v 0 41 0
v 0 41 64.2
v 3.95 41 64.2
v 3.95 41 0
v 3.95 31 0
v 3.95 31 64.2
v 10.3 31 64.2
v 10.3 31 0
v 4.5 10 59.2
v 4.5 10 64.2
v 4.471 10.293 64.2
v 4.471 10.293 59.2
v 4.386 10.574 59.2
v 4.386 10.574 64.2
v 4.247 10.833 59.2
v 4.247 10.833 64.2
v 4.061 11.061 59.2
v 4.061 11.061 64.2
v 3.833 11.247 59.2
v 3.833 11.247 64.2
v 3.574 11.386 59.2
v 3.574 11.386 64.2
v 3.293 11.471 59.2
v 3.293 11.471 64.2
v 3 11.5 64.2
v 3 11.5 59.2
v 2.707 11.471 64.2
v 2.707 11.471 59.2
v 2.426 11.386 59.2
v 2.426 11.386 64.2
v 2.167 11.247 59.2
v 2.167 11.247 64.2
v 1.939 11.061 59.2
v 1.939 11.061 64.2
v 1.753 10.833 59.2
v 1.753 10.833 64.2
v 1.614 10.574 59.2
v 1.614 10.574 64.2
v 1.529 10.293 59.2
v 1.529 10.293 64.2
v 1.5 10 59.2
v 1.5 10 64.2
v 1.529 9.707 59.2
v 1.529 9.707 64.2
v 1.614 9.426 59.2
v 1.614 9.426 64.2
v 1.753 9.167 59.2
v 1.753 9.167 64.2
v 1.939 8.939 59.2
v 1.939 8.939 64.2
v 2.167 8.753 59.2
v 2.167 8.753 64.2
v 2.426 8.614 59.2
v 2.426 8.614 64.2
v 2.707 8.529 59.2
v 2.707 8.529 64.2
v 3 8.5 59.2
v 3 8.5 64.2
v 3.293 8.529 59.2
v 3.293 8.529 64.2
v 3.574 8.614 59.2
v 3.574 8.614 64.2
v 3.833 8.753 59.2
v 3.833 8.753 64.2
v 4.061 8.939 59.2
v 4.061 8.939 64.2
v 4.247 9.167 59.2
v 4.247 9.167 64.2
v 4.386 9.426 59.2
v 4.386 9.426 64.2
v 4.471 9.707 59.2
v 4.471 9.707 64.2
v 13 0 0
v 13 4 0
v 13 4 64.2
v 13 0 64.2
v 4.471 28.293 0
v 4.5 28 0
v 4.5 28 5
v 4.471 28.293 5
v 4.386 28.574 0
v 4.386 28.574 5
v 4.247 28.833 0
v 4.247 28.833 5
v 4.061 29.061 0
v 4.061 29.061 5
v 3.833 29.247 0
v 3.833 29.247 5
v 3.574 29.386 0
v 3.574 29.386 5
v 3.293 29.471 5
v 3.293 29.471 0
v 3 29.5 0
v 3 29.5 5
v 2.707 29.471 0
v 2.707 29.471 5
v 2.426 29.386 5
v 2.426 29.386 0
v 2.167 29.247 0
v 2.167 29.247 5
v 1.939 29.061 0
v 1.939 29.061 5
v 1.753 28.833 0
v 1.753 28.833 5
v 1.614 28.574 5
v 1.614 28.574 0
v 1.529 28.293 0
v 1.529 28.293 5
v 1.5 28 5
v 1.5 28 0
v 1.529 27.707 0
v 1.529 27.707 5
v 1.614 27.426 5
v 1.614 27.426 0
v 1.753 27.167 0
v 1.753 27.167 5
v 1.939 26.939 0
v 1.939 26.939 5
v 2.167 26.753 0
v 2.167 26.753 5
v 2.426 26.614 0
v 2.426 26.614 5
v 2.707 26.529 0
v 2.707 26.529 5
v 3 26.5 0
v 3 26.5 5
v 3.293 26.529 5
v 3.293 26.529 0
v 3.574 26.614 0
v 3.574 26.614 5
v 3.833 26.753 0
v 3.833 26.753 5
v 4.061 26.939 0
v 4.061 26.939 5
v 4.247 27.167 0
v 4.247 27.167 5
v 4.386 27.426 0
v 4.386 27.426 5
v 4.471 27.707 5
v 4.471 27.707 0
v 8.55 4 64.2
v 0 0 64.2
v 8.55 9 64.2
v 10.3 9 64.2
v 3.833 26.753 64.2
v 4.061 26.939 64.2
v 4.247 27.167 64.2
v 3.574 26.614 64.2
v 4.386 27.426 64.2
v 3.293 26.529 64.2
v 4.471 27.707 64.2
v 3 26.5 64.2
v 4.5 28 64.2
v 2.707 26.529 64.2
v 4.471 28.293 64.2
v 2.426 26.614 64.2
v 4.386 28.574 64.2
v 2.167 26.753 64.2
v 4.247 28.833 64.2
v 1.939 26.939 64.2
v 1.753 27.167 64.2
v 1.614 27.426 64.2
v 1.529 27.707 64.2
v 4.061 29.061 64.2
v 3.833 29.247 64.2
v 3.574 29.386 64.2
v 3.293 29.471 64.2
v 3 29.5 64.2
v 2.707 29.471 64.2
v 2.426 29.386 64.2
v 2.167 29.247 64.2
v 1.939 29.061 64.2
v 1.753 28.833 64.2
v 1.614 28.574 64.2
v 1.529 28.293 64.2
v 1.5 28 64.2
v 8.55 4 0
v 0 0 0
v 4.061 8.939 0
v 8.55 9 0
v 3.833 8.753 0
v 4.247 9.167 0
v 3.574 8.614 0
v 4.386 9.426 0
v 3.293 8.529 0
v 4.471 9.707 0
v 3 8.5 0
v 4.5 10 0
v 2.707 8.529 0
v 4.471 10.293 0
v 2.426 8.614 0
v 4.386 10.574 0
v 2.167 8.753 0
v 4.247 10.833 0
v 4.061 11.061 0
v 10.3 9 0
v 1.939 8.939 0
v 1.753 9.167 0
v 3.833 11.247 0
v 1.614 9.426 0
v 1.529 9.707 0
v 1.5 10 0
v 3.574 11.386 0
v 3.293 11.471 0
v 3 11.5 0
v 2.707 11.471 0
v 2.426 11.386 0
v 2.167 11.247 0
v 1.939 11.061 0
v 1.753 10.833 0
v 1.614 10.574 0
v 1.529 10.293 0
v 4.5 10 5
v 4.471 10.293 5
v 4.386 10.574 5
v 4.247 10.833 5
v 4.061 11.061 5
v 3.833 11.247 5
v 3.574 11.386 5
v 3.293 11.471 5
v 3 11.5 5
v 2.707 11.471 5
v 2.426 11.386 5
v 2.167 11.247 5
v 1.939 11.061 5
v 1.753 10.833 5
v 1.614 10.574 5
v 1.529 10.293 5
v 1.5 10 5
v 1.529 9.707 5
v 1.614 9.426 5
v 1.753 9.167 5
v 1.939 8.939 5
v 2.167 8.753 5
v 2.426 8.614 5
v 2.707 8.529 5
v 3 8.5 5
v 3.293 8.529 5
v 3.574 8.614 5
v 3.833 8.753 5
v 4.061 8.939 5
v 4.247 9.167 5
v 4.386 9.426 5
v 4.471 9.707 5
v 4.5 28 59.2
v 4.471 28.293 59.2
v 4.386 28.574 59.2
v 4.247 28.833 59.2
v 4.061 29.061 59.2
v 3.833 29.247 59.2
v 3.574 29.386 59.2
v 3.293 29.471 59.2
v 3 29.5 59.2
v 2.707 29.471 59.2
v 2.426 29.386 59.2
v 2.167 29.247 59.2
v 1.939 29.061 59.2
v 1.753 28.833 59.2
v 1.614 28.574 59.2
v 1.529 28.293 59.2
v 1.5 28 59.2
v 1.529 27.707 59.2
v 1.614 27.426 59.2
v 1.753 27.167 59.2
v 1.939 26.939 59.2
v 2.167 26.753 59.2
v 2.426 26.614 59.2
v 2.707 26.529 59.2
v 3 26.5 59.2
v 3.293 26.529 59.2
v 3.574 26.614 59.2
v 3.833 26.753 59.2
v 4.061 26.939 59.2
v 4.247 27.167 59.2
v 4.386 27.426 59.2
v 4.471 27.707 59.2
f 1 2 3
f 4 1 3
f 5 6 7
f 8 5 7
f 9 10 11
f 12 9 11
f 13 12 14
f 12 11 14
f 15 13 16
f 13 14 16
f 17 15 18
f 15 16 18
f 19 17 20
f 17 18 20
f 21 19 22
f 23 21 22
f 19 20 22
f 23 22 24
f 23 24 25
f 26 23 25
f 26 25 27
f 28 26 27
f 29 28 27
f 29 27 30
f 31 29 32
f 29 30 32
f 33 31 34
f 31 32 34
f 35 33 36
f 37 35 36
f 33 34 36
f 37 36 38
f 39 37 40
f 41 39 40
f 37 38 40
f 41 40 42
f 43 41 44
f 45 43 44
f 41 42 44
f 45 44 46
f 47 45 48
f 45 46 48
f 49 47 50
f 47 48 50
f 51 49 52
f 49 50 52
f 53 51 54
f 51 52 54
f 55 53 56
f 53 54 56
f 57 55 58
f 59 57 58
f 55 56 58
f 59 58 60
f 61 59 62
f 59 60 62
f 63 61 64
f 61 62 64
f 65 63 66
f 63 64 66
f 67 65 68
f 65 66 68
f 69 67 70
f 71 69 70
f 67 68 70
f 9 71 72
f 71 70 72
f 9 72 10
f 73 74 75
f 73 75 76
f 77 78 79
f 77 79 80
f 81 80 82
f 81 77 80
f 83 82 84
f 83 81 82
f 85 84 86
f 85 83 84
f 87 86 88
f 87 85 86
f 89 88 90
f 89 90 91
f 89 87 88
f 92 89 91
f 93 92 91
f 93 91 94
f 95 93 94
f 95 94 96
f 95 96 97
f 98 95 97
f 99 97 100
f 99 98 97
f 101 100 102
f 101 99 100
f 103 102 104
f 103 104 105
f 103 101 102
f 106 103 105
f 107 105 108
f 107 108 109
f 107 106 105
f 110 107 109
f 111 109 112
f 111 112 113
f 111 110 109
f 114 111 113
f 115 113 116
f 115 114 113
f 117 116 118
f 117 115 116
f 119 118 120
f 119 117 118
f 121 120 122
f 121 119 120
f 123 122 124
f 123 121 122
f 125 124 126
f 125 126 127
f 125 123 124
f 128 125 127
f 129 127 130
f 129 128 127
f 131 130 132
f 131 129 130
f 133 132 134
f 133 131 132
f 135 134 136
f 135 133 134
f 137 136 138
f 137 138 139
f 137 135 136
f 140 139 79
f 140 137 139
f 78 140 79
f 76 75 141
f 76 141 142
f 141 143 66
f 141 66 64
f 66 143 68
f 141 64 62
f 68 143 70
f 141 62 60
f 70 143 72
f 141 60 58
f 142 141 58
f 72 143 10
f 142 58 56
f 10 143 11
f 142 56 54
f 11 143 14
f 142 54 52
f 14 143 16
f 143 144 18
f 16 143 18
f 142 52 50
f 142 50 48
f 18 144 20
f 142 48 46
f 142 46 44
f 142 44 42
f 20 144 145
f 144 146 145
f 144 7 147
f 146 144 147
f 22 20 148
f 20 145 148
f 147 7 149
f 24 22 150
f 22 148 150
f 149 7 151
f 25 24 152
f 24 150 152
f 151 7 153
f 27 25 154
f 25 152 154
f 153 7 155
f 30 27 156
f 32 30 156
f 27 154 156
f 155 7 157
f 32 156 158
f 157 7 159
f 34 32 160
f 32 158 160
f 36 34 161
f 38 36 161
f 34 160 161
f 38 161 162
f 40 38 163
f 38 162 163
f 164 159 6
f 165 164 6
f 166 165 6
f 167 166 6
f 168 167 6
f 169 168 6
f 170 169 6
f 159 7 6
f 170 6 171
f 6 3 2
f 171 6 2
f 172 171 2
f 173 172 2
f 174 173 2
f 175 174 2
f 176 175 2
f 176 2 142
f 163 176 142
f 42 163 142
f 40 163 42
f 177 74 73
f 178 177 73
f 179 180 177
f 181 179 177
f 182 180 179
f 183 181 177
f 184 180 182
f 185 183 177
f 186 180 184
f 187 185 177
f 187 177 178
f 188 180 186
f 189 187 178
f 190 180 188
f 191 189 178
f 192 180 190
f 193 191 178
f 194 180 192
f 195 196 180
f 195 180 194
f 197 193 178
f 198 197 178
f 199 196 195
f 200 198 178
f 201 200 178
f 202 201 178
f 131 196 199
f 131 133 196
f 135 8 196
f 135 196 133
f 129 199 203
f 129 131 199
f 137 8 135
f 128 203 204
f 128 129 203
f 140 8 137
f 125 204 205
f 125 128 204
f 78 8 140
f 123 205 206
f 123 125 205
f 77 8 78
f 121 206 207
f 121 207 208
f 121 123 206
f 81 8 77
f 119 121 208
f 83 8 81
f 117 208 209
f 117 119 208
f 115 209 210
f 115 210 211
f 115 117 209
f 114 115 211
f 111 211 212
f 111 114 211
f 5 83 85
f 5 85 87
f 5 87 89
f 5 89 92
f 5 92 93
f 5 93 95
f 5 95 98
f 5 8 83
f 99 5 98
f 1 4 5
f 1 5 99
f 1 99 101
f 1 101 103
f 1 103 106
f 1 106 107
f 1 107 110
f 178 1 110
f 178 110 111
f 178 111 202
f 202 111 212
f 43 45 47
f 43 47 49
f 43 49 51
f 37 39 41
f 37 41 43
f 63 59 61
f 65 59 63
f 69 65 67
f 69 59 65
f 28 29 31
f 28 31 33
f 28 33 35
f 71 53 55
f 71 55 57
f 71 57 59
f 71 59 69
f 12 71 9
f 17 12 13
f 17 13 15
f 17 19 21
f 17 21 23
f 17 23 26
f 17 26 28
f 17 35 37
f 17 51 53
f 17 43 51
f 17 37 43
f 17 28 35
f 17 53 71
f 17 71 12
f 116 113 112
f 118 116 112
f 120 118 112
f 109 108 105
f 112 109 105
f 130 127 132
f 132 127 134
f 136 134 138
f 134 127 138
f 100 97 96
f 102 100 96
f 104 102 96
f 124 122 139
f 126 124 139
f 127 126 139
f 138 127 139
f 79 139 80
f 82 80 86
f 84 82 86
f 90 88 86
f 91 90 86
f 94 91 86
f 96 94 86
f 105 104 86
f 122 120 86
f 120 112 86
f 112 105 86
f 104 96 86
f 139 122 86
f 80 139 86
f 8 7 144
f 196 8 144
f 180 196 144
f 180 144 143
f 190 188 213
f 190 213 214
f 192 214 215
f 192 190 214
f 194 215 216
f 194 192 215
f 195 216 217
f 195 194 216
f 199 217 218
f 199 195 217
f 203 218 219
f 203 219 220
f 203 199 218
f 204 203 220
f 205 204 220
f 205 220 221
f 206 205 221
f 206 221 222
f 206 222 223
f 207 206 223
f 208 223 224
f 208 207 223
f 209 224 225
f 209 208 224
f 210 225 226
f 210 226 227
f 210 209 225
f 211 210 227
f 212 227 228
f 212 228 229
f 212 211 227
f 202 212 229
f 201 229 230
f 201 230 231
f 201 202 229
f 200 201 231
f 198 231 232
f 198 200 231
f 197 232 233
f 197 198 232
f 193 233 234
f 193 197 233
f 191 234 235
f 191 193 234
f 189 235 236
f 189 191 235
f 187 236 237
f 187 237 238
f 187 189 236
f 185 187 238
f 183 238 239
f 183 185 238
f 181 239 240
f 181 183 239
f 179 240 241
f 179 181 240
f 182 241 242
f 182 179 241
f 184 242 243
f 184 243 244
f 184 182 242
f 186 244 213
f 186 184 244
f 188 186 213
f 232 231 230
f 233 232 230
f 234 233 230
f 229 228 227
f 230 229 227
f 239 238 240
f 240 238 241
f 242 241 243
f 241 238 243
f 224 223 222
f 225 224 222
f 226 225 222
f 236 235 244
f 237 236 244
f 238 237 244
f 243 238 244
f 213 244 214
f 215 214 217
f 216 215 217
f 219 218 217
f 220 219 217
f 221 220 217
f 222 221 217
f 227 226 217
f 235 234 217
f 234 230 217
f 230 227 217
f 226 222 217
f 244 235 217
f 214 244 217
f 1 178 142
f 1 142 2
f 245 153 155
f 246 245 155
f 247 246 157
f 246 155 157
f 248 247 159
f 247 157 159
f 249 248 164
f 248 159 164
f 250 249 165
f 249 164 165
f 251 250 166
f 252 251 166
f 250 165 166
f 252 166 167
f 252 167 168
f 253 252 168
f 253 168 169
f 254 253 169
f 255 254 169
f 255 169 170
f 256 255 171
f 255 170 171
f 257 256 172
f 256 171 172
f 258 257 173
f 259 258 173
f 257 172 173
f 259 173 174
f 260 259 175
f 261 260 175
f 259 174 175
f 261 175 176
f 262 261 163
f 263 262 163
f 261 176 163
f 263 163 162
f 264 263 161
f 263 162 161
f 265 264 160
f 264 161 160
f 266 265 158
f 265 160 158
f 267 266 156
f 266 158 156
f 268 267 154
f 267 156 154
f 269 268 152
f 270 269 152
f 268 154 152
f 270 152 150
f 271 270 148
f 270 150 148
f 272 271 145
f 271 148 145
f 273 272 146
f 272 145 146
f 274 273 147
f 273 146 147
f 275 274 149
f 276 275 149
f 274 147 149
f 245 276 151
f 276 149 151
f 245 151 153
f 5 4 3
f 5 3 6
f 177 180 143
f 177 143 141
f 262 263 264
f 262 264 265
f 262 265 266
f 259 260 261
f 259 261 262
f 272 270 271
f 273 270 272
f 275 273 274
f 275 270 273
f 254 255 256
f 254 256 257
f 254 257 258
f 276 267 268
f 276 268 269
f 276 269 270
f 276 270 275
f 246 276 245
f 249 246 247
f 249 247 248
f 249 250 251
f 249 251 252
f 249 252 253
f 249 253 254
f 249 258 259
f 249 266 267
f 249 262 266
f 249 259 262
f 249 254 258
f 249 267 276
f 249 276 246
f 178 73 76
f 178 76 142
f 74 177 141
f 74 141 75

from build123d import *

# Parameters (mm, degrees)
BOSS_EXTRUDE1_DEPTH = 64.2
SKETCH2_R           = 1.5
CUT_EXTRUDE1_DEPTH  = 5


with BuildPart() as part:
    # Sketch1 → Boss-Extrude1 (new body)
    with BuildSketch(Plane.XY):
        Polygon((0, 0), (0, 41), (3.95, 41), (3.95, 31), (10.3, 31), (10.3, 9), (8.55, 9), (8.55, 4), (13, 4), (13, 0), align=None)
    extrude(amount=BOSS_EXTRUDE1_DEPTH)

    # Sketch2 → Cut-Extrude1 (cut)
    with BuildSketch(Plane.XY.offset(64.2)):
        with Locations((3, 28)):
            Circle(SKETCH2_R)
        with Locations((3, 10)):
            Circle(SKETCH2_R)
    cut_extrude1 = extrude(amount=-CUT_EXTRUDE1_DEPTH, mode=Mode.SUBTRACT)

    # Mirror1: Cut-Extrude1 across plane
    add(cut_extrude1.mirror(Plane.XY.offset(32.1)), mode=Mode.SUBTRACT)


solid = part.part
